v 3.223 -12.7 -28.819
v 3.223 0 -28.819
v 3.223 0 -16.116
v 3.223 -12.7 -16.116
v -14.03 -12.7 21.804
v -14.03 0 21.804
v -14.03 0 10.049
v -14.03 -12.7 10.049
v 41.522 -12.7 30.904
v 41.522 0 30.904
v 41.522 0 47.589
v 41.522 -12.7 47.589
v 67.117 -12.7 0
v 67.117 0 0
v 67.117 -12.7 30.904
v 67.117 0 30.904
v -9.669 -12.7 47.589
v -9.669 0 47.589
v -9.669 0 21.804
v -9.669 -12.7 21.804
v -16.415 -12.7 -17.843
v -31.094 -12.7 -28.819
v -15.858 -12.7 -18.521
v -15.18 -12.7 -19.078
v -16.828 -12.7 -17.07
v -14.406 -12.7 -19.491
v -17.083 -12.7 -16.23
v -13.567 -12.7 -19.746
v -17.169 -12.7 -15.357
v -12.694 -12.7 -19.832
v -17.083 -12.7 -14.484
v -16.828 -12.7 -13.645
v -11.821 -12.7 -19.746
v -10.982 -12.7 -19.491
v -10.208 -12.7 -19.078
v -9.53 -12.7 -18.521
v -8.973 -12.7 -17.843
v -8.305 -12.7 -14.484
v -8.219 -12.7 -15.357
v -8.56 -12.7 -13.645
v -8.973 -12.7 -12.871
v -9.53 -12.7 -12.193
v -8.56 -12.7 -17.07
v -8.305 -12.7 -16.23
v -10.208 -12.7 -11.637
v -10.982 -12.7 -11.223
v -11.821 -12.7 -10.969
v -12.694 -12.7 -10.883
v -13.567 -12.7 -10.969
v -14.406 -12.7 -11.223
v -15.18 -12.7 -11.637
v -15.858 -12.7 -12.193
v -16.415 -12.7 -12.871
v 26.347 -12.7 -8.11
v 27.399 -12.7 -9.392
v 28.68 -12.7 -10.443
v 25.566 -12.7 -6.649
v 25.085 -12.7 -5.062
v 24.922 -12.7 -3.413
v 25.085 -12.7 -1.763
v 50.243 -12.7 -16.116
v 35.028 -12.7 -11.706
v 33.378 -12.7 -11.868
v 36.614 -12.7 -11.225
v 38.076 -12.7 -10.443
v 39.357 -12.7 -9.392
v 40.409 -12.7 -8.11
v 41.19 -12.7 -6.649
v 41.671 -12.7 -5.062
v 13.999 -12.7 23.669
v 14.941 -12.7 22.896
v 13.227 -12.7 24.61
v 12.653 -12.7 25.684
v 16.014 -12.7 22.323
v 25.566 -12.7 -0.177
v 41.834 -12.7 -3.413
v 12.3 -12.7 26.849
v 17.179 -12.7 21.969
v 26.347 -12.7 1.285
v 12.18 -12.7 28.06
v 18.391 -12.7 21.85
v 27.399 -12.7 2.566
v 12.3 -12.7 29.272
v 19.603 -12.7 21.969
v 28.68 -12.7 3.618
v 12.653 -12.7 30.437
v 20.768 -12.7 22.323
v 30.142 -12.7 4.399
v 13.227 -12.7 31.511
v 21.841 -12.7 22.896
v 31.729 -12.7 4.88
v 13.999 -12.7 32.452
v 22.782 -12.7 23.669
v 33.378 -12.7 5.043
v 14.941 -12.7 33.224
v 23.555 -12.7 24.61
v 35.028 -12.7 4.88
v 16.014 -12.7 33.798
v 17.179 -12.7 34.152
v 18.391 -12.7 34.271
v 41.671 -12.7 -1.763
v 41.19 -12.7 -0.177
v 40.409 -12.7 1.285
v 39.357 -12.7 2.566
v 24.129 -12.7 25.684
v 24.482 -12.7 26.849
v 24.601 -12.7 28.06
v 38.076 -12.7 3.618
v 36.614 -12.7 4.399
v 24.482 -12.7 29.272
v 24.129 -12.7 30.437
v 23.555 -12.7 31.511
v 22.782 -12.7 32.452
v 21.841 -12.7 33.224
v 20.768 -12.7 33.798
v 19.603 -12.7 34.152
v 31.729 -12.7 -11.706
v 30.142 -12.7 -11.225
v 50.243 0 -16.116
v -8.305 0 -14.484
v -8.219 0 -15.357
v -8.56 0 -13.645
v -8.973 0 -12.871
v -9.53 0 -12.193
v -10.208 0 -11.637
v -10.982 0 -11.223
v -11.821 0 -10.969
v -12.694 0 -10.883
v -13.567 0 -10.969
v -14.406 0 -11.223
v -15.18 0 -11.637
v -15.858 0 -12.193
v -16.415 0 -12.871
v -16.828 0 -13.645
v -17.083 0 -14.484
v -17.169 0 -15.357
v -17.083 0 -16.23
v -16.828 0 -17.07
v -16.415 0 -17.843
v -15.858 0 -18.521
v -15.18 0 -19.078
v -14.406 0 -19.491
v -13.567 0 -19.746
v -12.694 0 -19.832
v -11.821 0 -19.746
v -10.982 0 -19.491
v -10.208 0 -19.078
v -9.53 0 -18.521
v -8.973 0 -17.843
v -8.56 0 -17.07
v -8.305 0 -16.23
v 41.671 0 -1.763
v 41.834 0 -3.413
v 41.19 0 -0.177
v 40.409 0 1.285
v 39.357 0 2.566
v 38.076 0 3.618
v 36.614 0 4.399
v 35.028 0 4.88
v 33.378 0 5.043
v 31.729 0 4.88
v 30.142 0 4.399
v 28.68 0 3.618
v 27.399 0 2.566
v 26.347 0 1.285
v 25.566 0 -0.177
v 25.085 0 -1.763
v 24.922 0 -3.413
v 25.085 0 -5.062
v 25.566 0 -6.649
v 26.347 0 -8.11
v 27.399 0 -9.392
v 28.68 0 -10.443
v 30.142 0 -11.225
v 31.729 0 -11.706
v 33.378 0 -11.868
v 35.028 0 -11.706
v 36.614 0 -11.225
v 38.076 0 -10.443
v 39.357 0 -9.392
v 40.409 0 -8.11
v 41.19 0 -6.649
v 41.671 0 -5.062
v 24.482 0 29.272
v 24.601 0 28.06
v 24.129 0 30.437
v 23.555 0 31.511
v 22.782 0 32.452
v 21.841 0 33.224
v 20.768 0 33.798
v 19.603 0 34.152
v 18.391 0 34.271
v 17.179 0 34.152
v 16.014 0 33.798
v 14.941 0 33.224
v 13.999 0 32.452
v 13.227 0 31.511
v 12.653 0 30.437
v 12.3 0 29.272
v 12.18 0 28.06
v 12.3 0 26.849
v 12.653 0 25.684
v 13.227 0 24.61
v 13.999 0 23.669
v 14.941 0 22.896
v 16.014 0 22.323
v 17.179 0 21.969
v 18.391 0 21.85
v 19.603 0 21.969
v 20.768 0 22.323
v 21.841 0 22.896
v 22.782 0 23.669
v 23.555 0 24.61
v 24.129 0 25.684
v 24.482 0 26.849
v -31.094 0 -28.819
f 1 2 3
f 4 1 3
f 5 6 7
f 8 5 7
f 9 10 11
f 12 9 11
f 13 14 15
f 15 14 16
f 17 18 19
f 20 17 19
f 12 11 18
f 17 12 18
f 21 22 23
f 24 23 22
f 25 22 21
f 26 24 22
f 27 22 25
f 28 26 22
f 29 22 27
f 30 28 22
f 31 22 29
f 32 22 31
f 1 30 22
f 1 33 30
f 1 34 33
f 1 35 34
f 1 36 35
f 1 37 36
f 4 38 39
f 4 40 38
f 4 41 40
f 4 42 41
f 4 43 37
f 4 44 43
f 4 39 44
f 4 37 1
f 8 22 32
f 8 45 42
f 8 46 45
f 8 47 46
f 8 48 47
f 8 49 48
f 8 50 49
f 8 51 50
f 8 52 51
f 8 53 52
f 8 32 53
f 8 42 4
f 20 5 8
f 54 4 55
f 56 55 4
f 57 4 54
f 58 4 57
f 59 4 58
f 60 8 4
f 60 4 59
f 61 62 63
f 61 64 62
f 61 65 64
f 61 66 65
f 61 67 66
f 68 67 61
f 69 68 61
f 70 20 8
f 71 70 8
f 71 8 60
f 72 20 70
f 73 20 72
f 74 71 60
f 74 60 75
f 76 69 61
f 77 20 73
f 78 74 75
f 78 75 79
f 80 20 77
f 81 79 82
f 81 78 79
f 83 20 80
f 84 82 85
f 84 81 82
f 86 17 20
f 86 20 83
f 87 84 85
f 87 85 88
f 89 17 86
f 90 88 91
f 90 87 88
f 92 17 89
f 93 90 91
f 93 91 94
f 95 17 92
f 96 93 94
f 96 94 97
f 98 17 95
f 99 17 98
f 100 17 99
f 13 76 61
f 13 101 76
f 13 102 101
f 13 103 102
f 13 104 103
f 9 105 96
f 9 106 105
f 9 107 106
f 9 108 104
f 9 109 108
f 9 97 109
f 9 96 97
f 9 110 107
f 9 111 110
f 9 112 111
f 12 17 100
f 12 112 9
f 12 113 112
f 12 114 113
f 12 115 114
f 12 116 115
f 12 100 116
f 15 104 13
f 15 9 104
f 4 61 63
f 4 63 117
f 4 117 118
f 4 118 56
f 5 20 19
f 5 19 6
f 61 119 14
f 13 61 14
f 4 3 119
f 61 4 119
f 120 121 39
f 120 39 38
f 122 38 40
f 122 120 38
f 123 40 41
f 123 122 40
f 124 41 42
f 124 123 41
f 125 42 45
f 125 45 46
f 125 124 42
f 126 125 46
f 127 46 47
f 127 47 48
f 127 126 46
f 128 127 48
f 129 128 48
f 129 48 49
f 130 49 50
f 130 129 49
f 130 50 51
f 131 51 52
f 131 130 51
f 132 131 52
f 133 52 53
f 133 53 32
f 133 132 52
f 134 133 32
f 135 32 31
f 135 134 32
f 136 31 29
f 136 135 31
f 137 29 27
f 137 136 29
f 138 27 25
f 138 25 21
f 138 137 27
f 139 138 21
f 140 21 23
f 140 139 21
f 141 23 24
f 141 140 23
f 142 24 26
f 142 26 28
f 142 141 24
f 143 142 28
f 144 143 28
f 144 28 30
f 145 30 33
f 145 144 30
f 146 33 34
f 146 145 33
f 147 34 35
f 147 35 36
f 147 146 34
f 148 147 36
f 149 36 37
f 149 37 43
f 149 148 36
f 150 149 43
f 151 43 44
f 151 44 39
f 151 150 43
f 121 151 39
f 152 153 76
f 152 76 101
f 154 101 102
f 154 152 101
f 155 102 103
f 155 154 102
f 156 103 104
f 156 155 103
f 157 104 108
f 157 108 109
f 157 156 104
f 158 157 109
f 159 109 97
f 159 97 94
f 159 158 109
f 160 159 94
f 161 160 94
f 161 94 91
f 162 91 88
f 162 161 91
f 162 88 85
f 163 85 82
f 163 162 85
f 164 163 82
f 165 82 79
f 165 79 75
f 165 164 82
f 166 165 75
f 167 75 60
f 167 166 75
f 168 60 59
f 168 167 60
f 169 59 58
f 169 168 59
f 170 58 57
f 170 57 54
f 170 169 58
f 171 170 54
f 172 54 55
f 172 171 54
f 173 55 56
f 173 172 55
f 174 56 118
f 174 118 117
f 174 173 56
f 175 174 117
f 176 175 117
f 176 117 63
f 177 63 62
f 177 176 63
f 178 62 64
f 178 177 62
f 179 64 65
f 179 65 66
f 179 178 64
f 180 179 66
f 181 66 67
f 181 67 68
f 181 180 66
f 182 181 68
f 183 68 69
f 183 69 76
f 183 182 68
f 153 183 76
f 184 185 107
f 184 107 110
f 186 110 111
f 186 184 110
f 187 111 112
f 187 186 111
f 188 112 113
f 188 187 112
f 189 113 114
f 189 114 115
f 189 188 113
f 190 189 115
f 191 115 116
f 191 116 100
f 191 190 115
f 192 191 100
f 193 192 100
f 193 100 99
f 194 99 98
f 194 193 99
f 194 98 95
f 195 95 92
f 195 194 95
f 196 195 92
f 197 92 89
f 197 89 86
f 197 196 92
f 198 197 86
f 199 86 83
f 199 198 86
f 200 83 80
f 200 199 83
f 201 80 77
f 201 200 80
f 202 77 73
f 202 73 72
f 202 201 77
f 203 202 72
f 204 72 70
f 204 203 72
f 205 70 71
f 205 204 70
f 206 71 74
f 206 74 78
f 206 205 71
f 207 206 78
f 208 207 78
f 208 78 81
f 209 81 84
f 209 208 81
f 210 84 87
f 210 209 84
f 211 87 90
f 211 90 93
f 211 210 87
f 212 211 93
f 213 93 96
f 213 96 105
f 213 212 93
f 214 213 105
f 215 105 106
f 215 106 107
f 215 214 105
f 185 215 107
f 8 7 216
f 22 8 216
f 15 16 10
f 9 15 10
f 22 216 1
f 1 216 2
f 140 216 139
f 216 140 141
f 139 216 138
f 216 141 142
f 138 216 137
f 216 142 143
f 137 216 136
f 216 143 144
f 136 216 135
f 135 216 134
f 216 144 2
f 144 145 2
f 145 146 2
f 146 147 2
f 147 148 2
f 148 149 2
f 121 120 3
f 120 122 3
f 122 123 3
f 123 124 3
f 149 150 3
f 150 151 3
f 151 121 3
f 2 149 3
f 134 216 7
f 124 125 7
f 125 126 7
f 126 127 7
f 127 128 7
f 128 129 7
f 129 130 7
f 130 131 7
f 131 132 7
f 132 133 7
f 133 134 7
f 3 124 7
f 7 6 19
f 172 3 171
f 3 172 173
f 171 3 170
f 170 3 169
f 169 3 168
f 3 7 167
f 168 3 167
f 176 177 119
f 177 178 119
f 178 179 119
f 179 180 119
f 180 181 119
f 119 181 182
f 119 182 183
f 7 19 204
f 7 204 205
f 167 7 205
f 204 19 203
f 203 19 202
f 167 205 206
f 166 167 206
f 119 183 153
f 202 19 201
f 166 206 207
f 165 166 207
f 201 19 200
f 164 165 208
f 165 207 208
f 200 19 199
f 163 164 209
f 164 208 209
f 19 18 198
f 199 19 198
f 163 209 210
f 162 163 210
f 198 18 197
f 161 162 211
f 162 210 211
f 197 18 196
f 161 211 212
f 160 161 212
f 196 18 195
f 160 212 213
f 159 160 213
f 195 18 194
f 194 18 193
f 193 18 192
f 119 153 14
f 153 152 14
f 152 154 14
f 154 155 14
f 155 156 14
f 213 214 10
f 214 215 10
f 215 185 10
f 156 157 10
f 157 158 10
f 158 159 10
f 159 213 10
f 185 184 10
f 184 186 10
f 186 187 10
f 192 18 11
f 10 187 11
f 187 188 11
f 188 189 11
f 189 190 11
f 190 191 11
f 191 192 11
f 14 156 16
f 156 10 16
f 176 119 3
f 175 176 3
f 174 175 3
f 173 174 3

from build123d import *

# Parameters (mm, degrees)
F0_R     = 4.474653
F0_R_2   = 8.455693
F0_R_3   = 6.210572
F1_DEPTH = 12.7
F2_DEPTH = 12.7


with BuildPart() as f1:
    # F0 (on Front) → F1 (new body)
    with BuildSketch(Plane.XZ):
        Polygon((41.521776, 47.588885), (-9.669455, 47.588885), (-9.669455, 21.803673), (-14.030189, 21.803673), (-14.030189, 10.048649), (-31.093935, -28.818769), (3.223152, -28.818769), (3.223152, -16.115759), (50.243247, -16.115759), (67.117393, 0), (67.117393, 30.904336), (41.521776, 30.904336), align=None)
        with Locations((-12.693984, -15.35737)):
            Circle(F0_R, mode=Mode.SUBTRACT)
        with Locations((33.378128, -3.412749)):
            Circle(F0_R_2, mode=Mode.SUBTRACT)
        with Locations((18.390924, 28.060379)):
            Circle(F0_R_3, mode=Mode.SUBTRACT)
    extrude(amount=F1_DEPTH)

    # F0 (on Front) → F2 (join)
    with BuildSketch(Plane.XZ):
        Polygon((41.521776, 47.588885), (-9.669455, 47.588885), (-9.669455, 21.803673), (-14.030189, 21.803673), (-14.030189, 10.048649), (-31.093935, -28.818769), (3.223152, -28.818769), (3.223152, -16.115759), (50.243247, -16.115759), (67.117393, 0), (67.117393, 30.904336), (41.521776, 30.904336), align=None)
        with Locations((-12.693984, -15.35737)):
            Circle(F0_R, mode=Mode.SUBTRACT)
        with Locations((33.378128, -3.412749)):
            Circle(F0_R_2, mode=Mode.SUBTRACT)
        with Locations((18.390924, 28.060379)):
            Circle(F0_R_3, mode=Mode.SUBTRACT)
    extrude(amount=F2_DEPTH)


solid = f1.part
